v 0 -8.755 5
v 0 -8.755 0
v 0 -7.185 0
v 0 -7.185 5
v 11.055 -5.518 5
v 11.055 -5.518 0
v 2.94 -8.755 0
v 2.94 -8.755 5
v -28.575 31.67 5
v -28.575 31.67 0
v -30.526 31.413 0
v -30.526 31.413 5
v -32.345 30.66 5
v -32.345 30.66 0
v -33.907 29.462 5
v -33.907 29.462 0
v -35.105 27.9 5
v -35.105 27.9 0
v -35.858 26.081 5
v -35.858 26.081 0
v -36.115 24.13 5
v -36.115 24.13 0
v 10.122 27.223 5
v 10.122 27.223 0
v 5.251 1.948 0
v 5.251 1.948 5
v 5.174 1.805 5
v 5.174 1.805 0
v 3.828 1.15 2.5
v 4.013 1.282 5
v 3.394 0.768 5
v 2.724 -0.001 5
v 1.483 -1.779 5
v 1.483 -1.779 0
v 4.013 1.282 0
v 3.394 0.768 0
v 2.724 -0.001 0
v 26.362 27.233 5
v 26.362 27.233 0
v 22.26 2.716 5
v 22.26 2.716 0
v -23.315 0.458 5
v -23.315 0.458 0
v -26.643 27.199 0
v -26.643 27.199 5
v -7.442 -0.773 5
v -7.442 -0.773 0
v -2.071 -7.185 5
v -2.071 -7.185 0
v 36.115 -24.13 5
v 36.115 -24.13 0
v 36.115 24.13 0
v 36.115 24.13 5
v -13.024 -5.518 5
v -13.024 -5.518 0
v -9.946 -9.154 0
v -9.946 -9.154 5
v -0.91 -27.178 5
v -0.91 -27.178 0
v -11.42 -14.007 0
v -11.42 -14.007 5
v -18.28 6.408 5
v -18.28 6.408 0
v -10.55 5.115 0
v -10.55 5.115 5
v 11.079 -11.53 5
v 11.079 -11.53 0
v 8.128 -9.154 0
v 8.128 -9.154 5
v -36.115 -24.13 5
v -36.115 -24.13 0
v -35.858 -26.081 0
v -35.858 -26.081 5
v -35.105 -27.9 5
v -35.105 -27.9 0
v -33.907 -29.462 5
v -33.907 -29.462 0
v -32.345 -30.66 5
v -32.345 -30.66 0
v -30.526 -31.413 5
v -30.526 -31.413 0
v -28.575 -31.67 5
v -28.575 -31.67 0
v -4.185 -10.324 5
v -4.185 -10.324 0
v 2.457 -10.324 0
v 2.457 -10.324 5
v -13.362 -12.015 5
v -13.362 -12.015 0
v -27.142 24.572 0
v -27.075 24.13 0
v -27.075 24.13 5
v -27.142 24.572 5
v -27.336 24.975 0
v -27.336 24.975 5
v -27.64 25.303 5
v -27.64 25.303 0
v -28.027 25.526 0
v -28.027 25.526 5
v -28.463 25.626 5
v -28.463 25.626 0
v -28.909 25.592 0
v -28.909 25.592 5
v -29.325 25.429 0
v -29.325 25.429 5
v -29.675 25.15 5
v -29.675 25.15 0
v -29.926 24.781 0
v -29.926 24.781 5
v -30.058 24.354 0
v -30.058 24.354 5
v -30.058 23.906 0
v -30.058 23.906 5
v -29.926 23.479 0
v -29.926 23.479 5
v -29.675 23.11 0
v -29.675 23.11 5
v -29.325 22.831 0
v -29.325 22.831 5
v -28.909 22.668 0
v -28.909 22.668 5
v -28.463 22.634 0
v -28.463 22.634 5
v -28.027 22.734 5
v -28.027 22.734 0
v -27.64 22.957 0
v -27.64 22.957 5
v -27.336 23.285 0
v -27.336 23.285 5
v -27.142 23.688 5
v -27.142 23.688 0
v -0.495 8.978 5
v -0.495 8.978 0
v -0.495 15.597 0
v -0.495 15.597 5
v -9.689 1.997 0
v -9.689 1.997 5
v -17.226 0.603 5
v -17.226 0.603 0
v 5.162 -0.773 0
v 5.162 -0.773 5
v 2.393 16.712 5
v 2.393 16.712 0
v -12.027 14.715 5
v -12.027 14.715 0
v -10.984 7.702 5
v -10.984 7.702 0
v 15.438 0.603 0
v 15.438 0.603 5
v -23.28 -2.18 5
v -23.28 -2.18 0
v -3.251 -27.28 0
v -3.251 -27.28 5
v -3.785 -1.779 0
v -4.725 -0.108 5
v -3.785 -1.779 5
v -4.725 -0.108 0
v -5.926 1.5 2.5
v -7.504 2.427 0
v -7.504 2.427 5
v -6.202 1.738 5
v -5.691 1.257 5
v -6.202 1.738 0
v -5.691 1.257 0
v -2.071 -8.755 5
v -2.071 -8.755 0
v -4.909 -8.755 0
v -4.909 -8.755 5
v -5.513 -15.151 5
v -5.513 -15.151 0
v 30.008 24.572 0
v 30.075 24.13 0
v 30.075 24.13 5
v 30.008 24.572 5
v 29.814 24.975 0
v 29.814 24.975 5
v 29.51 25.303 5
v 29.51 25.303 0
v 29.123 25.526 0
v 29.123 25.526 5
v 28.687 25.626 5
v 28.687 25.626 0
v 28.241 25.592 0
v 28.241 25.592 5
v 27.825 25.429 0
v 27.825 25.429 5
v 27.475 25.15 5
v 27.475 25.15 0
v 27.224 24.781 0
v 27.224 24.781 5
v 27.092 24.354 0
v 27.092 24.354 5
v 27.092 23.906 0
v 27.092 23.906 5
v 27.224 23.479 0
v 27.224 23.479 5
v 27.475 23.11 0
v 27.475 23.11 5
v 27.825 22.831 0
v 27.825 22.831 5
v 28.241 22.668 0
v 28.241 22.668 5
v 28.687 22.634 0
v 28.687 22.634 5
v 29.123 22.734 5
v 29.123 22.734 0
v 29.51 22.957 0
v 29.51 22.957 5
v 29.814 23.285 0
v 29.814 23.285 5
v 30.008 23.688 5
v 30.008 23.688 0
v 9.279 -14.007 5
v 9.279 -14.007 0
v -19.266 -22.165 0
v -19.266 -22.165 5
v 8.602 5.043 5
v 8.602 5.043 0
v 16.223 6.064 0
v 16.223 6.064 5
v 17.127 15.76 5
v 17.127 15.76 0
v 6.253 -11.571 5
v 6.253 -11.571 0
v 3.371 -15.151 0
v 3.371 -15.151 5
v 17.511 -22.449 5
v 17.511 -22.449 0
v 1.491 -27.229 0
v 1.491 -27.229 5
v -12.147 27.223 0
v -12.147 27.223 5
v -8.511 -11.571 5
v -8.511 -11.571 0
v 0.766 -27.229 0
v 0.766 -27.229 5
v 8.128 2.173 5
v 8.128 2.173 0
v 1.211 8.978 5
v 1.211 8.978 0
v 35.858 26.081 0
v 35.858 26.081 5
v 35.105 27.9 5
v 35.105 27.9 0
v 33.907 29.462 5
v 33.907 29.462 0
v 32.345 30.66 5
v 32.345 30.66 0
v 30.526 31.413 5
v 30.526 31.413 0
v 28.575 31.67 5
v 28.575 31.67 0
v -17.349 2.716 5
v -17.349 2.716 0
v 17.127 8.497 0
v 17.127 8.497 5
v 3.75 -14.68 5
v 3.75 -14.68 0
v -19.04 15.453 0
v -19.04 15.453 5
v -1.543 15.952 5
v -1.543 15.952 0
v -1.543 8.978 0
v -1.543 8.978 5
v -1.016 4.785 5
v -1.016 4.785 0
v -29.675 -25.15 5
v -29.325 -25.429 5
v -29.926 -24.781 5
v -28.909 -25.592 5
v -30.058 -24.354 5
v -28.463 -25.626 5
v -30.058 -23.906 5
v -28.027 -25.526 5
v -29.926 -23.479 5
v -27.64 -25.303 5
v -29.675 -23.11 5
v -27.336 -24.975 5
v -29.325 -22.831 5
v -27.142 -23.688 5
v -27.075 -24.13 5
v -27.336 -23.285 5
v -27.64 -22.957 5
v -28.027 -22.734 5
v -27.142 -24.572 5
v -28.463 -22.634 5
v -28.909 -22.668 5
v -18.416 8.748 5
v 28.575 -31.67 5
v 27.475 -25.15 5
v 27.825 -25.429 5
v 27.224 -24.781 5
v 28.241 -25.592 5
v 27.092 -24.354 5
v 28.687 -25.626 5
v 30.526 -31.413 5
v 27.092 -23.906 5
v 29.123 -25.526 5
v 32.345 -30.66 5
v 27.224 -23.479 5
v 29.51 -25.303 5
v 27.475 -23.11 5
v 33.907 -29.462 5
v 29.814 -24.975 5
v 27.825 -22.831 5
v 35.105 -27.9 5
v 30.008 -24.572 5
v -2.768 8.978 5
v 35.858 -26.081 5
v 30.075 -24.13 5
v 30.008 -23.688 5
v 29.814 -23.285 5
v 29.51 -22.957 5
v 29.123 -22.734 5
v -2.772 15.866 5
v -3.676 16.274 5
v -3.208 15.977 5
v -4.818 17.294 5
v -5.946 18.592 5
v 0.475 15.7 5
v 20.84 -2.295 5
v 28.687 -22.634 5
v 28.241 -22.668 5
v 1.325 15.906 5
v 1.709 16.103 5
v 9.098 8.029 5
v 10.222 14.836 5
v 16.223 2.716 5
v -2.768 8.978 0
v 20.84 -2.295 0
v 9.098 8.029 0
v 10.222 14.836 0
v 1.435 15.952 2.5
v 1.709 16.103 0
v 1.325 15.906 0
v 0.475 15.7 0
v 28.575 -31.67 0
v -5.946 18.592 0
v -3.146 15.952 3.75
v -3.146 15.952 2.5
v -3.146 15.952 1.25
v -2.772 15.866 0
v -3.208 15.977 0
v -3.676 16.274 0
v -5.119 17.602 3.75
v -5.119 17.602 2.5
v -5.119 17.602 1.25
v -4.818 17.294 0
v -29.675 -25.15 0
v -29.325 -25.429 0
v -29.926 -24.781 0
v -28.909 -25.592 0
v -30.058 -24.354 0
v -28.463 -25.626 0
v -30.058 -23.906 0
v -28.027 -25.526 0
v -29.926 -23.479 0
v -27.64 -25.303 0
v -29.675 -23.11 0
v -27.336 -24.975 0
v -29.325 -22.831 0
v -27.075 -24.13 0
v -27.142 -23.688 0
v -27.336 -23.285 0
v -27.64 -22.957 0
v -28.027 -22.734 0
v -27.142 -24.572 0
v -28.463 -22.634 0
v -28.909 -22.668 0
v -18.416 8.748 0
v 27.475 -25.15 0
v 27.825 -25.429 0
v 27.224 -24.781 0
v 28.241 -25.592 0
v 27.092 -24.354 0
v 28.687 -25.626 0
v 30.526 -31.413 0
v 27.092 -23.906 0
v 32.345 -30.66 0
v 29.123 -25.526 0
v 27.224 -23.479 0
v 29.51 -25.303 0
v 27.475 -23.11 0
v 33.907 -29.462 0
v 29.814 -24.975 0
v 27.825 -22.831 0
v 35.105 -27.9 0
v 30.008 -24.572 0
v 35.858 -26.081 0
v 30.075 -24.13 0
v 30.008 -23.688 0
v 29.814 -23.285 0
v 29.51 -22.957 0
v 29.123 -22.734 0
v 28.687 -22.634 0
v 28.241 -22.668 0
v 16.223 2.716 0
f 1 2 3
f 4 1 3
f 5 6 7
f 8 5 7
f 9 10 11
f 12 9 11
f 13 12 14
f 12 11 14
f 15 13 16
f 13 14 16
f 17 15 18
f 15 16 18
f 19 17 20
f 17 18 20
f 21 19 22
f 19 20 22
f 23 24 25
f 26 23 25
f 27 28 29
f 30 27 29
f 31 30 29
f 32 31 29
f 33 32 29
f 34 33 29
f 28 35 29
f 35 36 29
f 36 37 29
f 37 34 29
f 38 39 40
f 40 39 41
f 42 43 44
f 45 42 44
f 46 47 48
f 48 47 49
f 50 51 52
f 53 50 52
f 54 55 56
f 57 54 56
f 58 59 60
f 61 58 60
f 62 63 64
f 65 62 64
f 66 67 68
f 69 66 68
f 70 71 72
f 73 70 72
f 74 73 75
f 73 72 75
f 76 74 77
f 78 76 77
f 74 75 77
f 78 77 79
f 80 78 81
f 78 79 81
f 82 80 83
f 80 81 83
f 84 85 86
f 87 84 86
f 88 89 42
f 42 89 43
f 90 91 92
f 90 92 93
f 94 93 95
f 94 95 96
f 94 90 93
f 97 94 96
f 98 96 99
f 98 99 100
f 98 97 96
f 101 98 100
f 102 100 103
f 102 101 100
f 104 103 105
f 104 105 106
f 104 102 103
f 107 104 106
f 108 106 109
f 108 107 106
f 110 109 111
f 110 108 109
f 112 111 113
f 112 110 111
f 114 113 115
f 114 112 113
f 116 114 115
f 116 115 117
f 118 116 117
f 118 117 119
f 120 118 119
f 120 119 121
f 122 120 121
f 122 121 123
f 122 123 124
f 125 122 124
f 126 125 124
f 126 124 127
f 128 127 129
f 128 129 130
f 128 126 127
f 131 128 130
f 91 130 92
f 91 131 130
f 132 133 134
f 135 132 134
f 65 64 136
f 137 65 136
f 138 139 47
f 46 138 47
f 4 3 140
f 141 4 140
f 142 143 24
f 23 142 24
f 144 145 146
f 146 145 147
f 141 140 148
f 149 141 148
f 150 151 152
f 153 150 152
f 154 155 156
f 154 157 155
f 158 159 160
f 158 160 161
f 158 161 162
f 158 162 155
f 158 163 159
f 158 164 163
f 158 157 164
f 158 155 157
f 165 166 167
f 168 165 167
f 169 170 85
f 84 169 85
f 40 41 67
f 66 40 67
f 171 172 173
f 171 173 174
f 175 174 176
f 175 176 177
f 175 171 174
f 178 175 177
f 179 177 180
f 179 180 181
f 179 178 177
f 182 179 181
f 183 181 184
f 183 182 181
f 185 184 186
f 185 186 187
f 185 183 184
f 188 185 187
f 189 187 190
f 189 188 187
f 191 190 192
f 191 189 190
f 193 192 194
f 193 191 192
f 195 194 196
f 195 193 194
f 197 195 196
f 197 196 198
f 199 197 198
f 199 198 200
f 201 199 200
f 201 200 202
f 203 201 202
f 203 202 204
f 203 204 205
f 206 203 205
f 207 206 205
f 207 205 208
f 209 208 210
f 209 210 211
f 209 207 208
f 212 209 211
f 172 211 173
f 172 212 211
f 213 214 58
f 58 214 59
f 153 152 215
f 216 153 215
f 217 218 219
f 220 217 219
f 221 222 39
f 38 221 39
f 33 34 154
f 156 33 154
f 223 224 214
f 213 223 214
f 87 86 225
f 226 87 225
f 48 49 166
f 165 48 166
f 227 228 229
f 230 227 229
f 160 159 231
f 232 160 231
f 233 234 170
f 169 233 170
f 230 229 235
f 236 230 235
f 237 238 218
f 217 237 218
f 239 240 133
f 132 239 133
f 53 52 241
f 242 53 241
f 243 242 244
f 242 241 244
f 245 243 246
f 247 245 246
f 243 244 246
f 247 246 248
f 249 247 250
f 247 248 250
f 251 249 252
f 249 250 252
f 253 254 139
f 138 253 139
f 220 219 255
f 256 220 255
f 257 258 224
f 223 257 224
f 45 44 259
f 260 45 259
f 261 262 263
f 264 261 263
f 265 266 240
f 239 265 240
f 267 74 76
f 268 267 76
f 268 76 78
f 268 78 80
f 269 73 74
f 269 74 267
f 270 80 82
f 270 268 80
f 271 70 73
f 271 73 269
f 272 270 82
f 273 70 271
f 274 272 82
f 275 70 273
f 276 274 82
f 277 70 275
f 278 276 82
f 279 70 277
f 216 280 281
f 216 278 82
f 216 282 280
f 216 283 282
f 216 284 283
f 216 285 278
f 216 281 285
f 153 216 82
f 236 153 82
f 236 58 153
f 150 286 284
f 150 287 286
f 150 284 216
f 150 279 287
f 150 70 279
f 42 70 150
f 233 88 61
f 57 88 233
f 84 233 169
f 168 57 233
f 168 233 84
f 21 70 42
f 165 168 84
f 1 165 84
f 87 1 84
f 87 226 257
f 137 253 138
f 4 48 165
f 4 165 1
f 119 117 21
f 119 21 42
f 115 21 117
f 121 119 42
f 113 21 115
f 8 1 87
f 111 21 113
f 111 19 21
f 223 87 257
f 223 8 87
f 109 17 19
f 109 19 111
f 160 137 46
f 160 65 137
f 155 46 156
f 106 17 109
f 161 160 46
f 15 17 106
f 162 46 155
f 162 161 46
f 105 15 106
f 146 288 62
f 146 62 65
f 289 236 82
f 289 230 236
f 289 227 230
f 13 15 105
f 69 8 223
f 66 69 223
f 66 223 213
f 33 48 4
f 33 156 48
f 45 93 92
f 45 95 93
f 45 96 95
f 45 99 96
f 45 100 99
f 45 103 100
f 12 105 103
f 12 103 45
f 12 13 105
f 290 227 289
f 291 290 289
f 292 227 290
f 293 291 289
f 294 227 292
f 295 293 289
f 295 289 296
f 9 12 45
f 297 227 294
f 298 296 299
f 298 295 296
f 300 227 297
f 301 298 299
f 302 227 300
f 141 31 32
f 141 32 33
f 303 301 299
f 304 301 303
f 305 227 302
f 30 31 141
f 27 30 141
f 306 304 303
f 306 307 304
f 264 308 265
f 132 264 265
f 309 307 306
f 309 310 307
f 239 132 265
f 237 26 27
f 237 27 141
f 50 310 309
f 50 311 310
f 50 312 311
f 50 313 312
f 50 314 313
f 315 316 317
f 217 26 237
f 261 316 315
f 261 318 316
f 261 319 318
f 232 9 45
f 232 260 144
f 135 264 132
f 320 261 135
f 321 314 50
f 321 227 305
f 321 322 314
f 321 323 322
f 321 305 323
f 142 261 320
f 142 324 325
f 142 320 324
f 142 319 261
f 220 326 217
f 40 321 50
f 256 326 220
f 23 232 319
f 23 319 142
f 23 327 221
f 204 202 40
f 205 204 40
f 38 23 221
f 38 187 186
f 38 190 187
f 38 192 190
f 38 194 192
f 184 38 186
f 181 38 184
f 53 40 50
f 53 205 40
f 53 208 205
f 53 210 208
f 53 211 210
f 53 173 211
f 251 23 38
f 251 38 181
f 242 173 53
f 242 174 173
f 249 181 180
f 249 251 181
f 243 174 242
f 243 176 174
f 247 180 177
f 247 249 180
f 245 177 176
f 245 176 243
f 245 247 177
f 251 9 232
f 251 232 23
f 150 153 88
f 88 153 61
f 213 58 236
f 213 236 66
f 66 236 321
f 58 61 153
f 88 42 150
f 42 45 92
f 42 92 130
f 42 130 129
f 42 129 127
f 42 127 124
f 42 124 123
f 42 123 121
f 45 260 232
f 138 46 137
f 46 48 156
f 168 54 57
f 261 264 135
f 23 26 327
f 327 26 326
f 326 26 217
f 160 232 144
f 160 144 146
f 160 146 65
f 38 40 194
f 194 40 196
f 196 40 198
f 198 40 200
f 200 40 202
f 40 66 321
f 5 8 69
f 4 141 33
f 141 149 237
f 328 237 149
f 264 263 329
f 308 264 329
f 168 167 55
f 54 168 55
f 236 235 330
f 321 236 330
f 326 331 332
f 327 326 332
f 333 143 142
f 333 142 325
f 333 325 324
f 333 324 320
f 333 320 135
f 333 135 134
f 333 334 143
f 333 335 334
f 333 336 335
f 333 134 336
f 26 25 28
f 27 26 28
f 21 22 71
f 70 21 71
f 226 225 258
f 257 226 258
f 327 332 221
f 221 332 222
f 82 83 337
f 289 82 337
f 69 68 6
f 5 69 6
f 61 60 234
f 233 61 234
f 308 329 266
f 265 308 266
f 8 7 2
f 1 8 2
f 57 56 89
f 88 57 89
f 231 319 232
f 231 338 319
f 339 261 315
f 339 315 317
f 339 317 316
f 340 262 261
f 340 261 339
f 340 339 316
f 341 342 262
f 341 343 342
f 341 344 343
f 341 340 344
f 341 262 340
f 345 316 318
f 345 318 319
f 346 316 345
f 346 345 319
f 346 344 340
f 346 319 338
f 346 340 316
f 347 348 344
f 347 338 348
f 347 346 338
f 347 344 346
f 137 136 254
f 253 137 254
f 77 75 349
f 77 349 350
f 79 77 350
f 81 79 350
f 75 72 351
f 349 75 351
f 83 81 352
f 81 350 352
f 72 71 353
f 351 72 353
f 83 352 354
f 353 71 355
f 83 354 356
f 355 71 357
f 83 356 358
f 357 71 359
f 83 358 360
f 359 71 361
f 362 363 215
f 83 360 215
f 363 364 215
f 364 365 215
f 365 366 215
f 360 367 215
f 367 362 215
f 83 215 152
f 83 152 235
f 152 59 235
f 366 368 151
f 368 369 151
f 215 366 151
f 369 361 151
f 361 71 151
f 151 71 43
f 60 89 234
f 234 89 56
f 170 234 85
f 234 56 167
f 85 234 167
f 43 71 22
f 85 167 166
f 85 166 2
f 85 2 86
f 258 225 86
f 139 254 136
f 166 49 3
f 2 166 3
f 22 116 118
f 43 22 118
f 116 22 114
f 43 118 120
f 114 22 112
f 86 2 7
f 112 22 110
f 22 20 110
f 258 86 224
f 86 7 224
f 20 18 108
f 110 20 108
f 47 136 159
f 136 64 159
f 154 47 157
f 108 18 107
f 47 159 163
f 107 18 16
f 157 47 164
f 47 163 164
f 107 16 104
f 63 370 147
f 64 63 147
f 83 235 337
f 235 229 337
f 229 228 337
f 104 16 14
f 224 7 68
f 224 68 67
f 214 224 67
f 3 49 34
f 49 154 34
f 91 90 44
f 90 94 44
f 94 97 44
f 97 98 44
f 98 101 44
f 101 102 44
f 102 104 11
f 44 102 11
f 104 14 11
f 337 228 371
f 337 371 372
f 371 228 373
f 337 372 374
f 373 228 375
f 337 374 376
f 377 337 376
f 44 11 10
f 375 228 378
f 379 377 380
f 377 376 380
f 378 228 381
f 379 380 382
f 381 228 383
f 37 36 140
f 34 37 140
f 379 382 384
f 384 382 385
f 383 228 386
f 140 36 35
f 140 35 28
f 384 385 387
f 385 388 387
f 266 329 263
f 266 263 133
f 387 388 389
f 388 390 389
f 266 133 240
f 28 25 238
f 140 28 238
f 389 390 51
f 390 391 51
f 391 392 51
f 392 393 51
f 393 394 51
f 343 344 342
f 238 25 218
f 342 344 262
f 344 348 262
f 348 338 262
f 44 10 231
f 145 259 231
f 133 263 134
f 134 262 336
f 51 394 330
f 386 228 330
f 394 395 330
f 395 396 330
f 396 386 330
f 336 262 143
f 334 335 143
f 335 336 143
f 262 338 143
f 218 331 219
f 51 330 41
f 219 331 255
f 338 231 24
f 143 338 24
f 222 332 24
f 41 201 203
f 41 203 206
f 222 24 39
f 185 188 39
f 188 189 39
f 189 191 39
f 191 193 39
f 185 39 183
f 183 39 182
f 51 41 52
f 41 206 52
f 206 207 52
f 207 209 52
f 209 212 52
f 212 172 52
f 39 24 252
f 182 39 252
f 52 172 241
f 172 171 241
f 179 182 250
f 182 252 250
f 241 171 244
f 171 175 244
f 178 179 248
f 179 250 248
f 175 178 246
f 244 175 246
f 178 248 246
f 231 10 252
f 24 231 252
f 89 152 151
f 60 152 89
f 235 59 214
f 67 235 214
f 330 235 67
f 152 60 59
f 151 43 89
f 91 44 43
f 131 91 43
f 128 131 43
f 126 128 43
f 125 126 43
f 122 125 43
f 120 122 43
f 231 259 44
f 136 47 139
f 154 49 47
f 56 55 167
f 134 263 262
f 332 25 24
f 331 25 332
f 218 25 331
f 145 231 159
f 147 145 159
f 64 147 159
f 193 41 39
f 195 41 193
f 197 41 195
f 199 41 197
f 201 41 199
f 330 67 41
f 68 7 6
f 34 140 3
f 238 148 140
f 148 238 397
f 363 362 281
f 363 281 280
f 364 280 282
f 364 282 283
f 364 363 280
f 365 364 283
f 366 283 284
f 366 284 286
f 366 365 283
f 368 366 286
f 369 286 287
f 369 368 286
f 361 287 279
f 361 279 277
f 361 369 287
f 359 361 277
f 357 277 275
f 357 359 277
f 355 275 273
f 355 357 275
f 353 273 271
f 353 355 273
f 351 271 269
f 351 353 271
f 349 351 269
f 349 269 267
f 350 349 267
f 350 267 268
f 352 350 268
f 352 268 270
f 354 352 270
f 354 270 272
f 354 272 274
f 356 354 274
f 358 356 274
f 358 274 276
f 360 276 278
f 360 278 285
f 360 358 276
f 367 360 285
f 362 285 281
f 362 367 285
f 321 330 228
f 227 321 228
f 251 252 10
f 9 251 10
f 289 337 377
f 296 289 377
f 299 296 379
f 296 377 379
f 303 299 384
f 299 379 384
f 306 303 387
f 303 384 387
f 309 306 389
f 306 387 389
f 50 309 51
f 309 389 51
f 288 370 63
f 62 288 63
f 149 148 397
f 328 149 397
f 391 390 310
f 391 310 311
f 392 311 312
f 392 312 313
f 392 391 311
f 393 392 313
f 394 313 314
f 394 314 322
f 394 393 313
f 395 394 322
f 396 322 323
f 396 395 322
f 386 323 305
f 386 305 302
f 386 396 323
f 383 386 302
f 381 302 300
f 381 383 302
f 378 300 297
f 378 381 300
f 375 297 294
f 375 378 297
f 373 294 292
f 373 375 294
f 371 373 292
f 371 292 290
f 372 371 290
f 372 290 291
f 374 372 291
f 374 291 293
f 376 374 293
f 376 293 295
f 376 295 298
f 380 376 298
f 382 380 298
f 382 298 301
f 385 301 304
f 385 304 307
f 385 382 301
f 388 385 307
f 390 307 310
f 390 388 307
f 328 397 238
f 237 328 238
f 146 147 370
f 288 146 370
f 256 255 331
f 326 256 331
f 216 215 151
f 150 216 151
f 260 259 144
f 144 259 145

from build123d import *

# Parameters (mm, degrees)
F0_R     = 1.5
F1_DEPTH = 5


with BuildPart() as f1:
    # F0 (on Top) → F1 (new body)
    with BuildSketch(Plane.XY):
        with BuildLine():
            Line((28.575, 31.67), (-28.575, 31.67))
            ThreePointArc((-28.575, 31.67), (-33.9065851301, 29.4615851301), (-36.115, 24.13))
            Line((-36.115, 24.13), (-36.115, -24.13))
            ThreePointArc((-36.115, -24.13), (-33.9065851301, -29.4615851301), (-28.575, -31.67))
            Line((-28.575, -31.67), (28.575, -31.67))
            ThreePointArc((28.575, -31.67), (33.9065851301, -29.4615851301), (36.115, -24.13))
            Line((36.115, -24.13), (36.115, 24.13))
            ThreePointArc((36.115, 24.13), (33.9065851301, 29.4615851301), (28.575, 31.67))
        make_face()
        with Locations((-28.575, -24.13)):
            Circle(F0_R, mode=Mode.SUBTRACT)
        Polygon((6.2527900536, -11.5708104593), (9.2793256044, -14.0073262155), (-0.9104009134, -27.1782091798), (-11.4204209558, -14.0073262155), (-8.51109229, -11.5708104593), (-5.5128769018, -15.1508381907), (-4.1845976375, -10.3244902566), (2.4567989167, -10.3244902566), (3.3706848119, -15.1508381907), (3.7498176424, -14.6798956216), align=None, mode=Mode.SUBTRACT)
        Polygon((-23.2801141861, -2.1800489627), (-3.2509050798, -27.2801313549), (-19.2656442523, -22.165434435), align=None, mode=Mode.SUBTRACT)
        with Locations((28.575, -24.13)):
            Circle(F0_R, mode=Mode.SUBTRACT)
        Polygon((0.7662613061, -27.2293109447), (20.8395048976, -2.2951872088), (17.5112579018, -22.4489029497), (1.4907777077, -27.2293109447), align=None, mode=Mode.SUBTRACT)
        Polygon((-9.9460659389, -9.1543504968), (-13.361800462, -12.0149729773), (-23.3147393549, 0.4577904218), (-26.6425088048, 27.1988492459), (-19.0398674458, 15.4525628313), (-12.0270624757, 14.7153204307), (-10.9837119319, 7.7022297044), (-18.4164068339, 8.7475319435), (-18.2800174343, 6.4083864975), (-10.5500826612, 5.114952568), (-9.6885105595, 1.9968850538), (-17.3490952176, 2.7163710911), (-17.2258857638, 0.603268214), (-7.4416000808, -0.7727516371), (-2.0714257844, -7.1850237437), (-2.0714257844, -8.754757233), (-4.9091139808, -8.754757233), (-13.0237422309, -5.51773565), align=None, mode=Mode.SUBTRACT)
        with BuildLine():
            add(Edge.make_bspline(
                [(-1.5434205998, 15.9520953894), (-2.1127854677, 15.8652707774), (-3.1954940882, 15.7001644261), (-4.2268327688, 16.8407808297), (-5.4375210158, 17.6281538425), (-9.2633203303, 23.0989462448), (-12.147068046, 27.2226296365)],
                knots=[0, 0, 0, 0, 0.1812052149, 0.3445812332, 0.5059692848, 1, 1, 1, 1], degree=3))
            Line((-1.5434205998, 15.9520953894), (-1.5434205998, 8.9782960713))
            Line((-1.5434205998, 8.9782960713), (-2.7677833568, 8.9782960713))
            Line((-2.7677833568, 8.9782960713), (-1.0155849159, 4.7854543664))
            Line((-1.0155849159, 4.7854543664), (1.2114524143, 8.9782960713))
            Line((1.2114524143, 8.9782960713), (-0.495339511, 8.9782960713))
            Line((-0.495339511, 8.9782960713), (-0.495339511, 15.5966216698))
            add(Edge.make_bspline(
                [(2.392585855, 16.7120974511), (2.1150017163, 16.4235156809), (1.4856865312, 15.7692675998), (0.2149107712, 15.6585198064), (-0.495339511, 15.5966216698)],
                knots=[0, 0, 0, 0, 0.4410892114, 1, 1, 1, 1], degree=3))
            Line((2.392585855, 16.7120974511), (10.12203563, 27.2226296365))
            Line((10.12203563, 27.2226296365), (5.2505019121, 1.9477001624))
            Line((5.2505019121, 1.9477001624), (5.1744488655, 1.8045151419))
            add(Edge.make_bspline(
                [(5.1744488655, 1.8045151419), (4.7180148969, 1.6646463966), (3.4212599775, 1.14619058), (2.2473178638, -0.6256342161), (1.4829438878, -1.7792999279)],
                knots=[0.1136874814, 0.1136874814, 0.1136874814, 0.1136874814, 0.4229066187, 1, 1, 1, 1], degree=3))
            Line((1.4829438878, -1.7792999279), (-3.7846511696, -1.7792999279))
            add(Edge.make_bspline(
                [(-7.5035453774, 2.4273574818), (-6.9701059824, 2.2073427858), (-5.6561009128, 1.6653872637), (-4.4820682586, -0.4955979623), (-3.7846511696, -1.7792999279)],
                knots=[0, 0, 0, 0, 0.4059644878, 1, 1, 1, 1], degree=3))
            Line((-7.5035453774, 2.4273574818), (-12.147068046, 27.2226296365))
        make_face(mode=Mode.SUBTRACT)
        with Locations((-28.575, 24.13)):
            Circle(F0_R, mode=Mode.SUBTRACT)
        Polygon((22.2602374852, 2.7163710911), (11.0789202031, -11.5303234741), (8.1275883001, -9.1543504968), (11.0552490609, -5.51773565), (2.9398098122, -8.754757233), (0, -8.754757233), (0, -7.1850237437), (5.1622066744, -0.7727516371), (15.4377110302, 0.603268214), (16.2226036191, 2.7163710911), (8.1275883001, 2.1730016451), (8.6015986256, 5.0433022481), (16.2226036191, 6.0638510984), (17.1265321758, 8.4974248905), (9.0981954709, 8.029313758), (10.2221901556, 14.8355001374), (17.1265321758, 15.7600787614), (26.3624843102, 27.2325830574), align=None, mode=Mode.SUBTRACT)
        with Locations((28.575, 24.13)):
            Circle(F0_R, mode=Mode.SUBTRACT)
    extrude(amount=F1_DEPTH)


solid = f1.part
